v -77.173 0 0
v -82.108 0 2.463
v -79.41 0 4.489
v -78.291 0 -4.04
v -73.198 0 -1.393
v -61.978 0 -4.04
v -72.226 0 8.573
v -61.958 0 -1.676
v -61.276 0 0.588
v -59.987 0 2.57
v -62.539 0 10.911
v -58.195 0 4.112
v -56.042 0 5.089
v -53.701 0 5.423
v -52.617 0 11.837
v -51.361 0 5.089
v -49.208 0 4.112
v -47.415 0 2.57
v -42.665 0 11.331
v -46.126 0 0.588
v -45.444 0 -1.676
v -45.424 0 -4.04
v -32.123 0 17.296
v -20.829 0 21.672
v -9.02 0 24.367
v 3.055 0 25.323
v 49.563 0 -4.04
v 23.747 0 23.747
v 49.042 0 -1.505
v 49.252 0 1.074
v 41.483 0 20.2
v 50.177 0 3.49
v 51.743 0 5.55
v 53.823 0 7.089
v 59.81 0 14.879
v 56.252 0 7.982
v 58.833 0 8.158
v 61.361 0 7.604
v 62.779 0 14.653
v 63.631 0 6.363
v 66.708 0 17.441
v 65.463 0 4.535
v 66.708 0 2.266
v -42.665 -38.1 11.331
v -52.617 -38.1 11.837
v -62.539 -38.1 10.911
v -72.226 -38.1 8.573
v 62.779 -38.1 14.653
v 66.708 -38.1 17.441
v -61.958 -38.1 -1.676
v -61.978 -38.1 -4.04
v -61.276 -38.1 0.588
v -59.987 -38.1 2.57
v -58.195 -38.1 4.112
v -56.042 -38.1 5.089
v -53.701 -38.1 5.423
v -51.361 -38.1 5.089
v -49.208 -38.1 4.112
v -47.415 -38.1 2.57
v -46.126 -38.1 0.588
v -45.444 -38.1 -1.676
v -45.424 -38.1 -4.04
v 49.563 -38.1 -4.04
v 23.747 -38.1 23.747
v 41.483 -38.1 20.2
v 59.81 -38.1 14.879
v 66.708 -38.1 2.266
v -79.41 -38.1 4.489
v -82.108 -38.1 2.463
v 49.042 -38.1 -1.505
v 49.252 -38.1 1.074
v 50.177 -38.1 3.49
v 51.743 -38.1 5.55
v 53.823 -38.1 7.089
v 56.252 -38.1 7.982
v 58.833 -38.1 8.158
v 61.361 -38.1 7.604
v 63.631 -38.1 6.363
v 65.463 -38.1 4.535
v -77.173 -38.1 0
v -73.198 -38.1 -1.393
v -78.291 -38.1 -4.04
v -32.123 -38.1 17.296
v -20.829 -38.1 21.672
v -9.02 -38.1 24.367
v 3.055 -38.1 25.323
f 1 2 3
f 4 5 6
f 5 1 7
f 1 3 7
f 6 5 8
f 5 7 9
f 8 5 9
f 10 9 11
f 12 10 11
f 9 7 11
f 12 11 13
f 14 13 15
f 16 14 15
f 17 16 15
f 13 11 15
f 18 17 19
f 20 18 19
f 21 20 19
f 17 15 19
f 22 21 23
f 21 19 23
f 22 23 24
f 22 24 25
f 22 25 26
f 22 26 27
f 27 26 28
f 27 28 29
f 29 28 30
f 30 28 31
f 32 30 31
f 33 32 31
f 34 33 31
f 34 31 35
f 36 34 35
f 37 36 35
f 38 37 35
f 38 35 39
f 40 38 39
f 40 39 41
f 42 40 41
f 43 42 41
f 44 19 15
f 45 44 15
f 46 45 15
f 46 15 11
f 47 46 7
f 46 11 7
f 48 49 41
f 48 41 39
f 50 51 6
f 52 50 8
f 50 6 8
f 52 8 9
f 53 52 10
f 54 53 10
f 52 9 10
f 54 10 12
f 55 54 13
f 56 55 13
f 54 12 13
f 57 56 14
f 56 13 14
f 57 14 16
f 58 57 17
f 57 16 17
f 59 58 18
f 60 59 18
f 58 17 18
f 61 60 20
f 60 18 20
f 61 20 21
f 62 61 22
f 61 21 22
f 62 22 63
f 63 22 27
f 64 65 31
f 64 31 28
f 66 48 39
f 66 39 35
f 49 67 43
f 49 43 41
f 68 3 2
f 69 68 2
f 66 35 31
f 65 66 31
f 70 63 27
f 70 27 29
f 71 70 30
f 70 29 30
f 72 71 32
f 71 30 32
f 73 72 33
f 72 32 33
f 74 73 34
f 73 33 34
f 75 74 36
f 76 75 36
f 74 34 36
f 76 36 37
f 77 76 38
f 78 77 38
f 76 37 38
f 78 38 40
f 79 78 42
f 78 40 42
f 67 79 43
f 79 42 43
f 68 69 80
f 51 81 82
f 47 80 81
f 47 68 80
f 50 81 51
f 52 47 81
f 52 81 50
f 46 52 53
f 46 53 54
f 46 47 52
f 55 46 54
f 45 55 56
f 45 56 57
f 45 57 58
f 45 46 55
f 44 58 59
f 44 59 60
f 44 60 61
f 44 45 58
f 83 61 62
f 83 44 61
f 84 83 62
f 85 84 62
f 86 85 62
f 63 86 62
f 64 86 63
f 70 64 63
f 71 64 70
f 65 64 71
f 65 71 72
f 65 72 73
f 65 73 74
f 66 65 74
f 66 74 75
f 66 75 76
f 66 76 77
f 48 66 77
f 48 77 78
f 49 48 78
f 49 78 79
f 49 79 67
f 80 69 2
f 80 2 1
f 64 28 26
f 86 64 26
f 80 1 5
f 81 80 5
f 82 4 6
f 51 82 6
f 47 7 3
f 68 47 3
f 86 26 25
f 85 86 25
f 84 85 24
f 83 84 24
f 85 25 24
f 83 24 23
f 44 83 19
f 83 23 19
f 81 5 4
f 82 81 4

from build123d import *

# Parameters (mm, degrees)
F1_DEPTH = 38.1


with BuildPart() as f1:
    # F0 (on Front) → F1 (new body)
    with BuildSketch(Plane.XZ):
        with BuildLine():
            Line((23.746809, 23.746809), (3.054569, 25.323361))
            ThreePointArc((3.054569, 25.323361), (-20.828977, 21.67196), (-42.665429, 11.331465))
            ThreePointArc((-42.665429, 11.331465), (-57.594957, 11.552189), (-72.225779, 8.5725))
            Line((-72.225779, 8.5725), (-79.409733, 4.488737))
            Line((-79.409733, 4.488737), (-82.107544, 2.463362))
            Line((-82.107544, 2.463362), (-77.172592, 0))
            Line((-77.172592, 0), (-73.197633, -1.392897))
            Line((-73.197633, -1.392897), (-78.291319, -4.039914))
            Line((-78.291319, -4.039914), (-67.496121, -4.039914))
            Line((-67.496121, -4.039914), (-61.978191, -4.039914))
            ThreePointArc((-61.978191, -4.039914), (-53.701295, 5.423382), (-45.424398, -4.039914))
            Line((-45.424398, -4.039914), (49.562849, -4.039914))
            ThreePointArc((49.562849, -4.039914), (55.005727, 7.621836), (66.707842, 2.266293))
            Line((66.707842, 2.266293), (66.707842, 6.207672))
            Line((66.707842, 6.207672), (66.707842, 17.440604))
            Line((66.707842, 17.440604), (62.779258, 14.65251))
            Line((62.779258, 14.65251), (59.81043, 14.878707))
            Line((59.81043, 14.878707), (41.483015, 20.199569))
            Line((41.483015, 20.199569), (23.746809, 23.746809))
        make_face()
    extrude(amount=F1_DEPTH)


solid = f1.part
